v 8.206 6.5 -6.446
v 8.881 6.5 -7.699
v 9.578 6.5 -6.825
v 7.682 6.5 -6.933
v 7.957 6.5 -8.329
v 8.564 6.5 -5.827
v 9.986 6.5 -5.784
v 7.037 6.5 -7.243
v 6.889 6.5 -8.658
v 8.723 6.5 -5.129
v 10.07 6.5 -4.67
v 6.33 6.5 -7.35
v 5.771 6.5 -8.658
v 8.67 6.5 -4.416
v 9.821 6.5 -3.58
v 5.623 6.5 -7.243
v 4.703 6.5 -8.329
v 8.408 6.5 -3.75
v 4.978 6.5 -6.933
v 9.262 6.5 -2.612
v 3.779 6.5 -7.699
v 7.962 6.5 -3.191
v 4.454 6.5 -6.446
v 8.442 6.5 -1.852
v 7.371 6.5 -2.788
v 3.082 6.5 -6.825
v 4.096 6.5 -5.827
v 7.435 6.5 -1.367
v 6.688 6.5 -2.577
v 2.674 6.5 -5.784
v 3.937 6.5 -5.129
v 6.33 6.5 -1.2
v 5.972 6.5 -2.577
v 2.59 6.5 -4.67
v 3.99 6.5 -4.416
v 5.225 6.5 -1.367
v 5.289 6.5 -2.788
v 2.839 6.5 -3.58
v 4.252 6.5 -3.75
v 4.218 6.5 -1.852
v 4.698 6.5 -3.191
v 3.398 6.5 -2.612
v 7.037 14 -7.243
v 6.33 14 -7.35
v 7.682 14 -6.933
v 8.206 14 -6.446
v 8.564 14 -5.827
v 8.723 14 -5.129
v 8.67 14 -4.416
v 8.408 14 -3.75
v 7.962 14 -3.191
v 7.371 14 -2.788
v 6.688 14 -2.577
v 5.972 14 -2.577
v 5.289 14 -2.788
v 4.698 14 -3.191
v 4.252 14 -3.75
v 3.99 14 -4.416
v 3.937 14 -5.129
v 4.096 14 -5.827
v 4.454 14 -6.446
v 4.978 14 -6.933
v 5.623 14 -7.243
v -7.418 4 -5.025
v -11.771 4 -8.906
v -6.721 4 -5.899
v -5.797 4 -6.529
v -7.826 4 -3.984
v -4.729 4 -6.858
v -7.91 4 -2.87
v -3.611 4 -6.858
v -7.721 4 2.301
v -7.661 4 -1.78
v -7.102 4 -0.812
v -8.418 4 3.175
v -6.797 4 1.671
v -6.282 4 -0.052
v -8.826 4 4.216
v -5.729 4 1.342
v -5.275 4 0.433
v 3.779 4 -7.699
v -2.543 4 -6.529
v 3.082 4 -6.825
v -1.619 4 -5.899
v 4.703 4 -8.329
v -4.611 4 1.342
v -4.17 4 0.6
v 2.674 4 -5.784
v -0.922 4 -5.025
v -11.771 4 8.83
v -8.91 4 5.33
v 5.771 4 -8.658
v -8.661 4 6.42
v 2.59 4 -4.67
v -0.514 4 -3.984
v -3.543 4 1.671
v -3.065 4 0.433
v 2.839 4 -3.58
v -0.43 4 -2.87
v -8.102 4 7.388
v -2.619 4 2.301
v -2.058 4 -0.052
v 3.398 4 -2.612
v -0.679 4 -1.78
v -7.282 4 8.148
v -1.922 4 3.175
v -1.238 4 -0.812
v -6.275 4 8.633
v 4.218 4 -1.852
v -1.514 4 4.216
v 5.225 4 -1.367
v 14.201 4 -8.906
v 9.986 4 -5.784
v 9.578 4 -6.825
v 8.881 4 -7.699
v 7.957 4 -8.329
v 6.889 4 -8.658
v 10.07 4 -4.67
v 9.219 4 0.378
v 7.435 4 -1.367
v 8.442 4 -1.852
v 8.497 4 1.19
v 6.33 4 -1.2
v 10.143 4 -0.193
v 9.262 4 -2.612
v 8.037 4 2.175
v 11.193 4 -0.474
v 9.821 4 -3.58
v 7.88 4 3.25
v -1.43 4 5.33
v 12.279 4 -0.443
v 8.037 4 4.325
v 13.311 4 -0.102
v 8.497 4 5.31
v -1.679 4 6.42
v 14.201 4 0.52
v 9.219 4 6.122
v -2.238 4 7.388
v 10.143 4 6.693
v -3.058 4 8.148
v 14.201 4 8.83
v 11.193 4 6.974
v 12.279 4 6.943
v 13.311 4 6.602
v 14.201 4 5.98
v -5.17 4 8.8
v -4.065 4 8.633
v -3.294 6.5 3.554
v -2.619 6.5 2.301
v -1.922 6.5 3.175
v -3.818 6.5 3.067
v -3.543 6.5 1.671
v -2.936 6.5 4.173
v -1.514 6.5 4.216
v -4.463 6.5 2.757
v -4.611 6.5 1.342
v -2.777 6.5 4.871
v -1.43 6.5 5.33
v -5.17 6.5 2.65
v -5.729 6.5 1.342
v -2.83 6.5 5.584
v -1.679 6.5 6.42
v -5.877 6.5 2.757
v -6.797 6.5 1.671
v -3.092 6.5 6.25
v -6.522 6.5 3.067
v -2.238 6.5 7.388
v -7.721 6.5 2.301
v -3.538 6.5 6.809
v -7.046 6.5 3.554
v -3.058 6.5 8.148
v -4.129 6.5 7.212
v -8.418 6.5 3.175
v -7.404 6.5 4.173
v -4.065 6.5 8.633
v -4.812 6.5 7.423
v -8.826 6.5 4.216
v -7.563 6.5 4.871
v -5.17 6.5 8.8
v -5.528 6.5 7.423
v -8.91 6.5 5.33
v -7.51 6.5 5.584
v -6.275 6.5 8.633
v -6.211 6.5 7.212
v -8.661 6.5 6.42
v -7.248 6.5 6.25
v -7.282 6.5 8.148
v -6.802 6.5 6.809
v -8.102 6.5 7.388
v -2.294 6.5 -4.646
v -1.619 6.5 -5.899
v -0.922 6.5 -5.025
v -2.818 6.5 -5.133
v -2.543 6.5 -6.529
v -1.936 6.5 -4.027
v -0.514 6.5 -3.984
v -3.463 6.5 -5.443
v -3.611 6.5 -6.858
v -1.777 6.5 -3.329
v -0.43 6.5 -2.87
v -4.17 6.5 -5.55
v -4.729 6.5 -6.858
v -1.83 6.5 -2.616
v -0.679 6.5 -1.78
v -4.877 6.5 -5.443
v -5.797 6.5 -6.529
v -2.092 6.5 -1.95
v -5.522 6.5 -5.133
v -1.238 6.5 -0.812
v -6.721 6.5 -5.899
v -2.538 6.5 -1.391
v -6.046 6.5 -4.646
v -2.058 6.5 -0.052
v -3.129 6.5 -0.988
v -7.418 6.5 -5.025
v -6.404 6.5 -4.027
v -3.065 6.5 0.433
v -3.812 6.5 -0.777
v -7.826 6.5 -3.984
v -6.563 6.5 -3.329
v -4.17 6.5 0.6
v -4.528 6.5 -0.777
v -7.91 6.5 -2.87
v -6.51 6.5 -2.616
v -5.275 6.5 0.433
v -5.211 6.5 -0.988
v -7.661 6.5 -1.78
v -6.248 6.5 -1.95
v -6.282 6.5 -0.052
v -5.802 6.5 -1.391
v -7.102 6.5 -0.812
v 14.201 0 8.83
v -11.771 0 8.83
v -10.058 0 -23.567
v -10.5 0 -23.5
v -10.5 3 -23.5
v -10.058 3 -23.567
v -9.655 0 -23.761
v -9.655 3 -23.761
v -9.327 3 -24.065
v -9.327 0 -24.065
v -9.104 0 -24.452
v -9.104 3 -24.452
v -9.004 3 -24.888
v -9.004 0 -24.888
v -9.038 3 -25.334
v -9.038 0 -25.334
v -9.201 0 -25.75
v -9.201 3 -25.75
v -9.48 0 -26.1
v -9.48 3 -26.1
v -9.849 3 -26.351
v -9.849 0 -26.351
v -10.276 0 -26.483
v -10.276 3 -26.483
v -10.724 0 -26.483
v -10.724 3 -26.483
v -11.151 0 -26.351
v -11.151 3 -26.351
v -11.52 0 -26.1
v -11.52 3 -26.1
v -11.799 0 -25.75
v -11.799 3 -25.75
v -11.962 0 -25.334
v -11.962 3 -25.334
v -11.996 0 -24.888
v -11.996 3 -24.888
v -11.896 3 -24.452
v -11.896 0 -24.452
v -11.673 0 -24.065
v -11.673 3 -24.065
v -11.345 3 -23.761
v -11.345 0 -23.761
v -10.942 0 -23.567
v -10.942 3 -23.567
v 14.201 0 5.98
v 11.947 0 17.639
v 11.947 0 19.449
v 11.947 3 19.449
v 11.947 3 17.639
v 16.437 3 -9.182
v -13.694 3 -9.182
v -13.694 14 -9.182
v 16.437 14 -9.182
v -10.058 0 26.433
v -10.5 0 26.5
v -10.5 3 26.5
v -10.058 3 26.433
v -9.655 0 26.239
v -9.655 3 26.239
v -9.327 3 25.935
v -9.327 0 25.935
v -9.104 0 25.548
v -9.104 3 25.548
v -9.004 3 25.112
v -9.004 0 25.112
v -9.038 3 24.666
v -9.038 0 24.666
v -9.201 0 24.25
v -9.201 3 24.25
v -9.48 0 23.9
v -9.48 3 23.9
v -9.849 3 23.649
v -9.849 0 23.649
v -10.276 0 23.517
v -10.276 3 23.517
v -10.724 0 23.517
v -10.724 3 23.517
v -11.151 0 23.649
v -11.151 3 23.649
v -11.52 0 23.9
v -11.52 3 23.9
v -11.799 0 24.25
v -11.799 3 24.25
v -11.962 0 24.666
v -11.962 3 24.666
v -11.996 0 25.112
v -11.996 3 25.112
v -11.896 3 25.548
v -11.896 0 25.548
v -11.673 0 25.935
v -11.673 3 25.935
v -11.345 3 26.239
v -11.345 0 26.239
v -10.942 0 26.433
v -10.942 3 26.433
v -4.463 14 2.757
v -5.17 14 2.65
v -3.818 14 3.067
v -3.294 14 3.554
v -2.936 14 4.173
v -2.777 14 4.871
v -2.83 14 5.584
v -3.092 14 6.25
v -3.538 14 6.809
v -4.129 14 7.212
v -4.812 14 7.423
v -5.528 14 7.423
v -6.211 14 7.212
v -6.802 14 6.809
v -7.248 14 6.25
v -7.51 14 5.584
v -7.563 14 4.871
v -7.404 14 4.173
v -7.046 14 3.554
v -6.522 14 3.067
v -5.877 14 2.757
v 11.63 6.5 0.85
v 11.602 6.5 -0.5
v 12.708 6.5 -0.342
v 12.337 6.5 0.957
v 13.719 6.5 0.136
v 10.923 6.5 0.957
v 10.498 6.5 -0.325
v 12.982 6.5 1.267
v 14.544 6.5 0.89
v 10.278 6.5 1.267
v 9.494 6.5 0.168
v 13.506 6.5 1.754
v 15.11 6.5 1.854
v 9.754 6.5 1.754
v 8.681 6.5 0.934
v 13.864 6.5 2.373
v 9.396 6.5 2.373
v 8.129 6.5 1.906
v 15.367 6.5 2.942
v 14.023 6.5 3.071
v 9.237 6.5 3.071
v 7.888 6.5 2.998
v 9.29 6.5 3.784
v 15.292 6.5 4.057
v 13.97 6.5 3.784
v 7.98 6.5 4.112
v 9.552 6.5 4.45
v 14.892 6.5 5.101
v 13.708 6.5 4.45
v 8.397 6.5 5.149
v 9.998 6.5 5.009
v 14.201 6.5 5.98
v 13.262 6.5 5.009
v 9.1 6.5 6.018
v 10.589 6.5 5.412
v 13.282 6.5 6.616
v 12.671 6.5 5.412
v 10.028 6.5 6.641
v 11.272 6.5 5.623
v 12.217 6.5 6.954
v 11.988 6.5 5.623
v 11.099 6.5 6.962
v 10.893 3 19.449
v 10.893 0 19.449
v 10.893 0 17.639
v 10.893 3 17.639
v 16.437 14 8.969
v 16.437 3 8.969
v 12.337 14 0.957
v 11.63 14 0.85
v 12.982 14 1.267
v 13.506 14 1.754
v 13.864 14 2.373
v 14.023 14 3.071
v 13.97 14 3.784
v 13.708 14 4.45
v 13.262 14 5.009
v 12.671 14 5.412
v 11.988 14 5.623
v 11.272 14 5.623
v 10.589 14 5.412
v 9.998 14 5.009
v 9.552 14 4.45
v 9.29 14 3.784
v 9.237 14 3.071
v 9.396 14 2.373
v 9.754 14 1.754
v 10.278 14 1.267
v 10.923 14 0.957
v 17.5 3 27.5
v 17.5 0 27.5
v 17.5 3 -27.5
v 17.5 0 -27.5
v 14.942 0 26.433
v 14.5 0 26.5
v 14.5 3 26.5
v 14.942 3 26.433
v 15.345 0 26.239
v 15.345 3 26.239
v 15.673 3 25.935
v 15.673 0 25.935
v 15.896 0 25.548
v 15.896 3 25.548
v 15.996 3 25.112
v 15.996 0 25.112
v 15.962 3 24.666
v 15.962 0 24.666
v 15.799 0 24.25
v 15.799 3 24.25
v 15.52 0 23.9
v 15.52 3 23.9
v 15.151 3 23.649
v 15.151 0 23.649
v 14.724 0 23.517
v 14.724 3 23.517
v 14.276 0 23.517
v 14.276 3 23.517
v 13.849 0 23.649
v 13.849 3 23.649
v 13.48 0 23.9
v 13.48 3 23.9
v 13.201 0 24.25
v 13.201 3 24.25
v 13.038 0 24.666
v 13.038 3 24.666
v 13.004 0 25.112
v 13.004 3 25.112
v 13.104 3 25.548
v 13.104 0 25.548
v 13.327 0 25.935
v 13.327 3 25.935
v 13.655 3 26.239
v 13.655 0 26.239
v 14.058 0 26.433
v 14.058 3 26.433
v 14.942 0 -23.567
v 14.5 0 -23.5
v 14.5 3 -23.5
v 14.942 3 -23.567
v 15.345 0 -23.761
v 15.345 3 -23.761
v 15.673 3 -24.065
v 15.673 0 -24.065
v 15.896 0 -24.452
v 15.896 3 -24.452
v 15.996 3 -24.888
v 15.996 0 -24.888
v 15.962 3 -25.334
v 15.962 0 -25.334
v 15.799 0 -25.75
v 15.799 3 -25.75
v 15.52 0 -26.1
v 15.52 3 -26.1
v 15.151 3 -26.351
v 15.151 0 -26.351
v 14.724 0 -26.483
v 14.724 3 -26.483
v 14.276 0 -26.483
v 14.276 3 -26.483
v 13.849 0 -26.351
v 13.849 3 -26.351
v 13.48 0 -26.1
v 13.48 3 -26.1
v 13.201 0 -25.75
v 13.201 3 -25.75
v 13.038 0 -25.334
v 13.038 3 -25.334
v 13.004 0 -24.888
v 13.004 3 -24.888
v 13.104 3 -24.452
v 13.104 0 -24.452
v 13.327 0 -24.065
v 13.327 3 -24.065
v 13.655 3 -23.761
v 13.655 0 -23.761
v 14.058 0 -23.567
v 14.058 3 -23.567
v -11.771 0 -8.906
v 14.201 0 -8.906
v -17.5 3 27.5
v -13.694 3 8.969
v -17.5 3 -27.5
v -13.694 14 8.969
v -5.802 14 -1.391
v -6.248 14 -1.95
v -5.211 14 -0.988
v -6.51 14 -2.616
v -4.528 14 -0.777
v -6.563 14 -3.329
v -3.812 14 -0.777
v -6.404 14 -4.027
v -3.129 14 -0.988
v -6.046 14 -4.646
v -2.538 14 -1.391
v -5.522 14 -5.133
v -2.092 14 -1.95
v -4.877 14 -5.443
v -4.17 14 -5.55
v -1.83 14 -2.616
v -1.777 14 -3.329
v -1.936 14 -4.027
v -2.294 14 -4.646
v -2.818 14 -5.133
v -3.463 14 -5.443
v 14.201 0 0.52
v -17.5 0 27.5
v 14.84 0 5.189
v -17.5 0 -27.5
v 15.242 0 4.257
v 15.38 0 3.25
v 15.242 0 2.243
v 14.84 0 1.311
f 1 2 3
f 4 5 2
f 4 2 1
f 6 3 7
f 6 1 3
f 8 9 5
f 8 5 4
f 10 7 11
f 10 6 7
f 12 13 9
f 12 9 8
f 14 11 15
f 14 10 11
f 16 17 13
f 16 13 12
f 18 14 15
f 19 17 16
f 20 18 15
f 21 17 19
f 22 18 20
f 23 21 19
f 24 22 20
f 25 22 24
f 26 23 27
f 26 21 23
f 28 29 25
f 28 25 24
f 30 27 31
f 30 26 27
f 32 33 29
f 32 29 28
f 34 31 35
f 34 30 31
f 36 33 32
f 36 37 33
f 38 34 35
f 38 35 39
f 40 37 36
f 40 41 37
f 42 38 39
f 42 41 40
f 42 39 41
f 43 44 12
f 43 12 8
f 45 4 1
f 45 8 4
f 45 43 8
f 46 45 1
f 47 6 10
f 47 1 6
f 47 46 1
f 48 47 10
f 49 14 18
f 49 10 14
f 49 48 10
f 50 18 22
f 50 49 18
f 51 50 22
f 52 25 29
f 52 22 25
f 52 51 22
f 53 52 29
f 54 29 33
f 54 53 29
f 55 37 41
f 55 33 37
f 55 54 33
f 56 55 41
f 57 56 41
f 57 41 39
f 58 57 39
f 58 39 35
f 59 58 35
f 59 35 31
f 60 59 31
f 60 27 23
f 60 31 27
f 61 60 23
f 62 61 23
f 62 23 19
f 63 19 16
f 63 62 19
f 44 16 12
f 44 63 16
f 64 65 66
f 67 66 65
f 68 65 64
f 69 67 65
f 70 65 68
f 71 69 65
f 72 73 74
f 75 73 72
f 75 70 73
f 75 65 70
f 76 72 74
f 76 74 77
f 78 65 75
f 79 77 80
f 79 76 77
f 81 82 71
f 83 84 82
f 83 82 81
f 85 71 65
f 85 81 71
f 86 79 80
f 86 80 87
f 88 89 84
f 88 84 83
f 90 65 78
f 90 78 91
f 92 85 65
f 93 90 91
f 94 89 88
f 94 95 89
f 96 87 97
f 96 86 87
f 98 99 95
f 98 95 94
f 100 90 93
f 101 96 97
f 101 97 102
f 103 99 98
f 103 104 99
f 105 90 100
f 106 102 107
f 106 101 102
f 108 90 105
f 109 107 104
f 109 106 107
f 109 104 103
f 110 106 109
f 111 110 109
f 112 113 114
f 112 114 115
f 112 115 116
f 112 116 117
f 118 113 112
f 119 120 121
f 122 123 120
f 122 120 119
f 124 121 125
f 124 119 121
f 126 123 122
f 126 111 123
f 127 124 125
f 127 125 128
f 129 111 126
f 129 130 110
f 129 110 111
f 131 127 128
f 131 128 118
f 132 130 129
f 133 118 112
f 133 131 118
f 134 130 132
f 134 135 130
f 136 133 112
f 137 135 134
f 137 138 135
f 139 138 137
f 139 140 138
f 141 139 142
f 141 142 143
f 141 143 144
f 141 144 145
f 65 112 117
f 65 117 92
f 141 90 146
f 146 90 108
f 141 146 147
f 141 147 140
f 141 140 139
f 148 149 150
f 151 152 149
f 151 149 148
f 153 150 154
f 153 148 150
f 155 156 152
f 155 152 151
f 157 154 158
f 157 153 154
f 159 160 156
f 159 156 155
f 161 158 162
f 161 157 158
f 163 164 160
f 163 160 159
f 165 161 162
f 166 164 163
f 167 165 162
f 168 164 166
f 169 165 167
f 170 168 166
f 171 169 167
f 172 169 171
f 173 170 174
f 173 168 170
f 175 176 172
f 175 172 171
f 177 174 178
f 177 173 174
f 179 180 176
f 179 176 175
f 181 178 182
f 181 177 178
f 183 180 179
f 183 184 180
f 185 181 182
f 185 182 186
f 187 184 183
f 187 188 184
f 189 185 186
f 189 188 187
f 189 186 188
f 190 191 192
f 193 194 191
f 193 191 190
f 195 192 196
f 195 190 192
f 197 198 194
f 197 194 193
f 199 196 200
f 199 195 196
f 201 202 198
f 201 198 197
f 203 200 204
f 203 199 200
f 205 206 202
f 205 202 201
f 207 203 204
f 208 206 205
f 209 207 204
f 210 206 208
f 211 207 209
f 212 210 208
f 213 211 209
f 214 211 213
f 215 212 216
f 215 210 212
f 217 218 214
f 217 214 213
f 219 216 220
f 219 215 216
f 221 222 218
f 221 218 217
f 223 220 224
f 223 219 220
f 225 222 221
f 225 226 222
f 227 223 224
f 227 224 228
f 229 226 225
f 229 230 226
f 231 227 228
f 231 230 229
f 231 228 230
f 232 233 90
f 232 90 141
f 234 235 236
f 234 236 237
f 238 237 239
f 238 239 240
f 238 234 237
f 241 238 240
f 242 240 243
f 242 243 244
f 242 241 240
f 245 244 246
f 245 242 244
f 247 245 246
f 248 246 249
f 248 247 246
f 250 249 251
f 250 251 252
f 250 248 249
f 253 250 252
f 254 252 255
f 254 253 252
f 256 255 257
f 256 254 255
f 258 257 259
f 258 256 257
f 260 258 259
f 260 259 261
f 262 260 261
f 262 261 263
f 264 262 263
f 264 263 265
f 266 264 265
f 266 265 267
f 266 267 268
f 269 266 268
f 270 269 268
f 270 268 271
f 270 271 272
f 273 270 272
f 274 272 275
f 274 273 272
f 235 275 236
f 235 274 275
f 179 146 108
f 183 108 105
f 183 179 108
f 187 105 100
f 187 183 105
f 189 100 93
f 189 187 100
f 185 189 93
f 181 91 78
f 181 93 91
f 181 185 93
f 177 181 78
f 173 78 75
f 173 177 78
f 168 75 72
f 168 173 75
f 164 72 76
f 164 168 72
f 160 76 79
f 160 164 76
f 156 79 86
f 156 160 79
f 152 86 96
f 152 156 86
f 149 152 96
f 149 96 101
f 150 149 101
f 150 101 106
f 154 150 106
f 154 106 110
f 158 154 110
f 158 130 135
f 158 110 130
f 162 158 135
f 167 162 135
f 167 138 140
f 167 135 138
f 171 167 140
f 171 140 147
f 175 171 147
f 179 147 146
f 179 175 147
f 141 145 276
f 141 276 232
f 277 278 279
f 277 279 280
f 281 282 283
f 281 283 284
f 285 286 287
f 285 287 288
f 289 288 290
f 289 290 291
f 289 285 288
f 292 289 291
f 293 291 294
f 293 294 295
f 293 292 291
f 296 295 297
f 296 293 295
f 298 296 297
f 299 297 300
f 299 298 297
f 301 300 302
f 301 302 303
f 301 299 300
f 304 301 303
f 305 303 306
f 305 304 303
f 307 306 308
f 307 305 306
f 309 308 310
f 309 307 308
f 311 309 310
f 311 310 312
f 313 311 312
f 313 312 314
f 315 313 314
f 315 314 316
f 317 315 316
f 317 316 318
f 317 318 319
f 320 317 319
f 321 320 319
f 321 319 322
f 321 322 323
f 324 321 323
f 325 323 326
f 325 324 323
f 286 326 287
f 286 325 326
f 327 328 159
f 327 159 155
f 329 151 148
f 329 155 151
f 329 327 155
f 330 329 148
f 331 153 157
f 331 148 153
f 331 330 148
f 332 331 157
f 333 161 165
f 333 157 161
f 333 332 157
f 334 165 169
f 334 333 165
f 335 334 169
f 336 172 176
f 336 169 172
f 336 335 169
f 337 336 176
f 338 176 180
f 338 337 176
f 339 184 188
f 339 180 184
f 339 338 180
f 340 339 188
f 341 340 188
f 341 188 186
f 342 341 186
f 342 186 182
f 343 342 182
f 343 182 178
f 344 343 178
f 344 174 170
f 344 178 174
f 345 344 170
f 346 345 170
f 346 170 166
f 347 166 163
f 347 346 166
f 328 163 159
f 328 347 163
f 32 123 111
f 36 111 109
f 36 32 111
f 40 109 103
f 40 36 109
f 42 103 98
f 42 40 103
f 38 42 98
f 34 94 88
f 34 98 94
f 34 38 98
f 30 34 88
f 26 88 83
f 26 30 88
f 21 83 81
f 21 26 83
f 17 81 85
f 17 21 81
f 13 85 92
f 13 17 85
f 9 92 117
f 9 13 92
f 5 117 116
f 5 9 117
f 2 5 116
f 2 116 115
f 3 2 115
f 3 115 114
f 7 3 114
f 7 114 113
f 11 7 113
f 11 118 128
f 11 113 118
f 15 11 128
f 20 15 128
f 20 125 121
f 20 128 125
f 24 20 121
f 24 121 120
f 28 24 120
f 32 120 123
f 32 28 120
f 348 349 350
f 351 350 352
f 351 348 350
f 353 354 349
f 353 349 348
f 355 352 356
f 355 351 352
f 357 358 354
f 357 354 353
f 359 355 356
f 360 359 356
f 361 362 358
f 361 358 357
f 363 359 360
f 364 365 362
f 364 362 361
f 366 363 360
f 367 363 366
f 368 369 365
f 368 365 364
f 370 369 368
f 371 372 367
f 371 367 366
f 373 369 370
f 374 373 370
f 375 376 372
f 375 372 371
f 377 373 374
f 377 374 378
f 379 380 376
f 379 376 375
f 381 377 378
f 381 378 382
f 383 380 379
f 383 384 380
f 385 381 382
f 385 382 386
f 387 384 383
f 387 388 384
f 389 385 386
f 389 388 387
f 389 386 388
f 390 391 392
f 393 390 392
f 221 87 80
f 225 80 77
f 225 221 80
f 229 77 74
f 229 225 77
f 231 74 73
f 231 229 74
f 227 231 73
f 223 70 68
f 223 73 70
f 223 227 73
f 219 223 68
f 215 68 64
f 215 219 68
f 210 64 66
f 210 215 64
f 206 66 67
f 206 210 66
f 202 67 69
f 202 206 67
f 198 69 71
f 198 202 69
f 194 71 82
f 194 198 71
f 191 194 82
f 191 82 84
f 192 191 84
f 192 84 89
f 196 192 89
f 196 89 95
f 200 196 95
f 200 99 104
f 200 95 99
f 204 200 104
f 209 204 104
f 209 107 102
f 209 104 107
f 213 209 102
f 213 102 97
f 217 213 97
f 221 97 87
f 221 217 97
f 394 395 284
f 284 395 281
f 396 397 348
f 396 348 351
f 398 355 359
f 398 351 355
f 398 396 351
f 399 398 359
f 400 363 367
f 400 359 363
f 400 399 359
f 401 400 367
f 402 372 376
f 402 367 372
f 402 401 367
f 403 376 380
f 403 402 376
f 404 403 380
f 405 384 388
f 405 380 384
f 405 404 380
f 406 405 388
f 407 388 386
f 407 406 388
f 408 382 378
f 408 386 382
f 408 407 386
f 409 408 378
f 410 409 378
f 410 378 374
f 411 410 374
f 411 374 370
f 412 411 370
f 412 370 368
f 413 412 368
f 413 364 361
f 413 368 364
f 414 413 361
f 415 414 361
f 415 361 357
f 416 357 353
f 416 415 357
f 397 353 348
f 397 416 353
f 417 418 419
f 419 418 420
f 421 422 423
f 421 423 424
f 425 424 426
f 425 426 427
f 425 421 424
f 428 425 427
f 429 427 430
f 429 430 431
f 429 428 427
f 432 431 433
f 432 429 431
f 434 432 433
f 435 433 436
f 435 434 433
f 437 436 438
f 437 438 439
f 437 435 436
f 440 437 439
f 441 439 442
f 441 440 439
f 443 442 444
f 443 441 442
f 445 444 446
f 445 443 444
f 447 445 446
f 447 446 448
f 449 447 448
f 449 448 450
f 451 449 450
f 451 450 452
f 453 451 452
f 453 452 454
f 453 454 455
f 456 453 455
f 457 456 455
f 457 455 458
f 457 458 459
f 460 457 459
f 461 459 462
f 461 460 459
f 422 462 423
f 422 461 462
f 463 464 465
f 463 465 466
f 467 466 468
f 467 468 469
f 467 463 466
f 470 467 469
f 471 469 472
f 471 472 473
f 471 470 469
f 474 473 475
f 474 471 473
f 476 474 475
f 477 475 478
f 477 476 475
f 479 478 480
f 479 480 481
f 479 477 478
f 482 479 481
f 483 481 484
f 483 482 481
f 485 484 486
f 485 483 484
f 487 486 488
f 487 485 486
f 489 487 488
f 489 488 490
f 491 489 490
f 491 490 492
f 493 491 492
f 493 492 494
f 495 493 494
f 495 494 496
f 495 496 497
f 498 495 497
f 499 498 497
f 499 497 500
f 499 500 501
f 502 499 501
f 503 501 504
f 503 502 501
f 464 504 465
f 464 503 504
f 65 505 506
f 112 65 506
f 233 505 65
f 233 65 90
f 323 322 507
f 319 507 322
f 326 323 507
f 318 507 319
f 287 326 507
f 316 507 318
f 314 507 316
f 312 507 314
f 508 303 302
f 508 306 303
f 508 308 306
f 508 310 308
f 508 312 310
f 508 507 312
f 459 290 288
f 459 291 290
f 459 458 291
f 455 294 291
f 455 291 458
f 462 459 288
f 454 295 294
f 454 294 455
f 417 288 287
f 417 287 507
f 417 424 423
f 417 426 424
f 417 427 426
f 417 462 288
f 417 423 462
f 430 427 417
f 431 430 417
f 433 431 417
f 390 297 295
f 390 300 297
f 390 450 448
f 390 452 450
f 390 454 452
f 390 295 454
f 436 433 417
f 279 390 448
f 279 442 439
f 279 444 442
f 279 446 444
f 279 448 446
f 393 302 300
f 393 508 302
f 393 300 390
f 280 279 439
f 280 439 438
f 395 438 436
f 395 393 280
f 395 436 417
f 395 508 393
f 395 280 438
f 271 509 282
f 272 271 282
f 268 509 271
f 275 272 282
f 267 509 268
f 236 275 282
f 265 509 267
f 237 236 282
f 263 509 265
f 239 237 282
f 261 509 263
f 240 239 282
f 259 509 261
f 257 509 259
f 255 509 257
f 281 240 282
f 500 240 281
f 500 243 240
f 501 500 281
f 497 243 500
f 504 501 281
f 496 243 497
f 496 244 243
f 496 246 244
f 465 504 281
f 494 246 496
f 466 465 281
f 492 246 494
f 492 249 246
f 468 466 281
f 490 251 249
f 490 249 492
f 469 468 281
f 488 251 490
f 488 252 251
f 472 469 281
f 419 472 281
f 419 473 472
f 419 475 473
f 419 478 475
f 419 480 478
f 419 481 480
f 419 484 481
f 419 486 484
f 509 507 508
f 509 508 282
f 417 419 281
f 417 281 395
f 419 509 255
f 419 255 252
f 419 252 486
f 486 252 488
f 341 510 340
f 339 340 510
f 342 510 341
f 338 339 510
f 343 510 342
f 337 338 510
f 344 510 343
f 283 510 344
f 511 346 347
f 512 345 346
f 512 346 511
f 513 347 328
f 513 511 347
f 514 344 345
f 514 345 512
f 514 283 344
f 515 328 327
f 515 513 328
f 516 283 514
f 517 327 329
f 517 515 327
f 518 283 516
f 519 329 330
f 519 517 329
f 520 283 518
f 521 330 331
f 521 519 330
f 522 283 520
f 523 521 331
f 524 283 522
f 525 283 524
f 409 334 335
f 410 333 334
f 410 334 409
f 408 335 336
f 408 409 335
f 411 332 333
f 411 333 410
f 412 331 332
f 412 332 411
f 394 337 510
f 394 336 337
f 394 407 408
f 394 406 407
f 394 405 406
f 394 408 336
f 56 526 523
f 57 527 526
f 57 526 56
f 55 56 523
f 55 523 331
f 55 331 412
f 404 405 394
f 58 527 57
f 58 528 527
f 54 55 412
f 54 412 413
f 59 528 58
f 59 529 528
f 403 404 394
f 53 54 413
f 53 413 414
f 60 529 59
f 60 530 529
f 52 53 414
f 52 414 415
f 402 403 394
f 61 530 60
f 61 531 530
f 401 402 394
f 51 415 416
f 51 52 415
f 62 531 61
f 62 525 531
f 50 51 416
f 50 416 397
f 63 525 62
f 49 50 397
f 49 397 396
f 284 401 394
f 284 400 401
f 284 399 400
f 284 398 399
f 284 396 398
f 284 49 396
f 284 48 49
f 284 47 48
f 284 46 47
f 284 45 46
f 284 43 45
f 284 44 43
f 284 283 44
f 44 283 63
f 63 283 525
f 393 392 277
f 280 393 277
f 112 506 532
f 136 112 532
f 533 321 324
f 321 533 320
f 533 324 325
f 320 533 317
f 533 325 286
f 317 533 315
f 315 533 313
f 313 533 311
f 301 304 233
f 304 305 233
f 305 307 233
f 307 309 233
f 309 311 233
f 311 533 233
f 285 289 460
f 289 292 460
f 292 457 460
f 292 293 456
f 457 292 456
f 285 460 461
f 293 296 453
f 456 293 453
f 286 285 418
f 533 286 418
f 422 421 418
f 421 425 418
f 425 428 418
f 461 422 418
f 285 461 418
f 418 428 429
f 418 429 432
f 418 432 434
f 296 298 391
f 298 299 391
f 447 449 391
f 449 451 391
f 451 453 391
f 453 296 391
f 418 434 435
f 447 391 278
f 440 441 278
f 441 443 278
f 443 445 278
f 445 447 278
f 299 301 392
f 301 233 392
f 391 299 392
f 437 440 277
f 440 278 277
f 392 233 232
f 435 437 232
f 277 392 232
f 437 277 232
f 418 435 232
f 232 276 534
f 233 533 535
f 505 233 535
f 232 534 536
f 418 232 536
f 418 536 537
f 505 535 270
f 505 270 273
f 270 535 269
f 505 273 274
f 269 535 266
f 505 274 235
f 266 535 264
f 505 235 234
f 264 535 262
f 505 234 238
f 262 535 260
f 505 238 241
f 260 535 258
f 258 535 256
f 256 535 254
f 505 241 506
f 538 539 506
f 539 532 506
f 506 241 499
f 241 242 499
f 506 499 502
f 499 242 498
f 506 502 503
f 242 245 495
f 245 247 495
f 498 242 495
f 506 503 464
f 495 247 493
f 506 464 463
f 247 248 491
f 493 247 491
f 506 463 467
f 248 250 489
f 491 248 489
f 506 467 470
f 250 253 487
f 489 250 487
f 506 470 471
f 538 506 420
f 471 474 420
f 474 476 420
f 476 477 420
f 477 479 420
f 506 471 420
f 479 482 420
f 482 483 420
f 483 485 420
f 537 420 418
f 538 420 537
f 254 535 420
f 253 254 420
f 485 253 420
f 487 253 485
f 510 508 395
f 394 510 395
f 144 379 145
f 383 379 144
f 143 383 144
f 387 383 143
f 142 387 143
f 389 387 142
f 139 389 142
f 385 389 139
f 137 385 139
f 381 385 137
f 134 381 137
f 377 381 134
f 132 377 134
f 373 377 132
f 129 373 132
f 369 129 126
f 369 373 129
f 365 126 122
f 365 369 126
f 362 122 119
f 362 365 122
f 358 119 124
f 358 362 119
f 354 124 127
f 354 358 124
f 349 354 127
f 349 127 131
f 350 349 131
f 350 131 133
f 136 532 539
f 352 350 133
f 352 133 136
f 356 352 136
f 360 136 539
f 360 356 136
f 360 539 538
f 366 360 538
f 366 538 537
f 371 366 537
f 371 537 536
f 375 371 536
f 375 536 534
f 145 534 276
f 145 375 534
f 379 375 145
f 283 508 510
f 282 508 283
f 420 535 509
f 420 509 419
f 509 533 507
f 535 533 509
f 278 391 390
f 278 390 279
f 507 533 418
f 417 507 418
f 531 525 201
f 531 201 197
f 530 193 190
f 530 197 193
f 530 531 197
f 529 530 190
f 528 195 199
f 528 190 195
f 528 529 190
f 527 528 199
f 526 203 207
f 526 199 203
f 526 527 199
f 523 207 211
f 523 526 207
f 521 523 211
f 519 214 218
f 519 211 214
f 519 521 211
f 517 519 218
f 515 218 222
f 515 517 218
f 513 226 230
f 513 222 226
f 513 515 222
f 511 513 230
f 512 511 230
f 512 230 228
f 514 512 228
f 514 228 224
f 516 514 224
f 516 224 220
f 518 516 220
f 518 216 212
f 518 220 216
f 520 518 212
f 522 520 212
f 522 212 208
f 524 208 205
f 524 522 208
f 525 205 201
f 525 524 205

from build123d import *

# Parameters (mm, degrees)
SKETCH1_W               = 35
SKETCH1_H               = 55
SKETCH1_R               = 1.5
SKETCH1_W_2             = 1.053264105
SKETCH1_H_2             = 1.810086697
BOSS_EXTRUDE1_DEPTH     = 3
SKETCH2_W               = 30.130506089
SKETCH2_H               = 18.151203477
BOSS_EXTRUDE2_DEPTH     = 11
SKETCH4_W               = 25.972666726
SKETCH4_H               = 17.735623468
CUT_EXTRUDE2_DEPTH      = 4
CUT_EXTRUDE3_DEPTH      = 36.47534355
CUT_EXTRUDE3_DEPTH_BACK = 36.47534355
SKETCH6_R               = 2.4
CUT_EXTRUDE4_DEPTH      = 35.095454242
CUT_EXTRUDE4_DEPTH_BACK = 2.5
SKETCH7_R               = 3.75


with BuildPart() as part:
    # Sketch1 → Boss-Extrude1 (new body)
    with BuildSketch(Plane(origin=(0, 0, 0), x_dir=(1, 0, 0), z_dir=(0, 1, 0))):
        Rectangle(SKETCH1_W, SKETCH1_H)
        with Locations(Location((14.5, 25, 0), (0, 0, 270))):
            Circle(SKETCH1_R, mode=Mode.SUBTRACT)
        with Locations(Location((-10.5, 25, 0), (0, 0, 270))):
            Circle(SKETCH1_R, mode=Mode.SUBTRACT)
        with Locations(Location((14.5, -25, 0), (0, 0, 270))):
            Circle(SKETCH1_R, mode=Mode.SUBTRACT)
        with Locations(Location((-10.5, -25, 0), (0, 0, 270))):
            Circle(SKETCH1_R, mode=Mode.SUBTRACT)
        with Locations((11.420031076, -18.543755043)):
            Rectangle(SKETCH1_W_2, SKETCH1_H_2, mode=Mode.SUBTRACT)
    extrude(amount=BOSS_EXTRUDE1_DEPTH)

    # Sketch2 → Boss-Extrude2 (add)
    with BuildSketch(Plane(origin=(0, 3, 0), x_dir=(1, 0, 0), z_dir=(0, 1, 0))):
        with Locations((1.371677436, 0.106547158)):
            Rectangle(SKETCH2_W, SKETCH2_H)
    extrude(amount=BOSS_EXTRUDE2_DEPTH)

    # Sketch4 → Cut-Extrude2 (cut)
    with BuildSketch(Plane.XZ):
        with Locations((1.214862274, -0.038232514)):
            Rectangle(SKETCH4_W, SKETCH4_H)
    extrude(amount=-CUT_EXTRUDE2_DEPTH, mode=Mode.SUBTRACT)

    # Sketch6 → Cut-Extrude3 (cut, two sides: drawn at the far end of the back side and taken through both)
    with BuildSketch(Plane.XZ.offset(-CUT_EXTRUDE3_DEPTH_BACK)):
        with Locations(Location((11.63, 3.25, 0), (0, 0, 270))):
            Circle(SKETCH6_R)
        with Locations(Location((-5.17, 5.05, 0), (0, 0, 270))):
            Circle(SKETCH6_R)
        with Locations(Location((-4.17, -3.15, 0), (0, 0, 270))):
            Circle(SKETCH6_R)
        with Locations(Location((6.33, -4.95, 0), (0, 0, 270))):
            Circle(SKETCH6_R)
    extrude(amount=CUT_EXTRUDE3_DEPTH + CUT_EXTRUDE3_DEPTH_BACK, mode=Mode.SUBTRACT)

    # Sketch7 → Cut-Extrude4 (cut, two sides: drawn at the far end of the back side and taken through both)
    with BuildSketch(Plane.XZ.offset(-4).offset(-CUT_EXTRUDE4_DEPTH_BACK)):
        with Locations(Location((-5.17, 5.05, 0), (0, 0, 90))):
            Circle(SKETCH7_R)
        with Locations(Location((-4.17, -3.15, 0), (0, 0, 90))):
            Circle(SKETCH7_R)
        with Locations(Location((6.33, -4.95, 0), (0, 0, 90))):
            Circle(SKETCH7_R)
        with Locations(Location((11.63, 3.25, 0), (0, 0, 46.713081775))):
            Circle(SKETCH7_R)
    extrude(amount=CUT_EXTRUDE4_DEPTH + CUT_EXTRUDE4_DEPTH_BACK, mode=Mode.SUBTRACT)


solid = part.part
